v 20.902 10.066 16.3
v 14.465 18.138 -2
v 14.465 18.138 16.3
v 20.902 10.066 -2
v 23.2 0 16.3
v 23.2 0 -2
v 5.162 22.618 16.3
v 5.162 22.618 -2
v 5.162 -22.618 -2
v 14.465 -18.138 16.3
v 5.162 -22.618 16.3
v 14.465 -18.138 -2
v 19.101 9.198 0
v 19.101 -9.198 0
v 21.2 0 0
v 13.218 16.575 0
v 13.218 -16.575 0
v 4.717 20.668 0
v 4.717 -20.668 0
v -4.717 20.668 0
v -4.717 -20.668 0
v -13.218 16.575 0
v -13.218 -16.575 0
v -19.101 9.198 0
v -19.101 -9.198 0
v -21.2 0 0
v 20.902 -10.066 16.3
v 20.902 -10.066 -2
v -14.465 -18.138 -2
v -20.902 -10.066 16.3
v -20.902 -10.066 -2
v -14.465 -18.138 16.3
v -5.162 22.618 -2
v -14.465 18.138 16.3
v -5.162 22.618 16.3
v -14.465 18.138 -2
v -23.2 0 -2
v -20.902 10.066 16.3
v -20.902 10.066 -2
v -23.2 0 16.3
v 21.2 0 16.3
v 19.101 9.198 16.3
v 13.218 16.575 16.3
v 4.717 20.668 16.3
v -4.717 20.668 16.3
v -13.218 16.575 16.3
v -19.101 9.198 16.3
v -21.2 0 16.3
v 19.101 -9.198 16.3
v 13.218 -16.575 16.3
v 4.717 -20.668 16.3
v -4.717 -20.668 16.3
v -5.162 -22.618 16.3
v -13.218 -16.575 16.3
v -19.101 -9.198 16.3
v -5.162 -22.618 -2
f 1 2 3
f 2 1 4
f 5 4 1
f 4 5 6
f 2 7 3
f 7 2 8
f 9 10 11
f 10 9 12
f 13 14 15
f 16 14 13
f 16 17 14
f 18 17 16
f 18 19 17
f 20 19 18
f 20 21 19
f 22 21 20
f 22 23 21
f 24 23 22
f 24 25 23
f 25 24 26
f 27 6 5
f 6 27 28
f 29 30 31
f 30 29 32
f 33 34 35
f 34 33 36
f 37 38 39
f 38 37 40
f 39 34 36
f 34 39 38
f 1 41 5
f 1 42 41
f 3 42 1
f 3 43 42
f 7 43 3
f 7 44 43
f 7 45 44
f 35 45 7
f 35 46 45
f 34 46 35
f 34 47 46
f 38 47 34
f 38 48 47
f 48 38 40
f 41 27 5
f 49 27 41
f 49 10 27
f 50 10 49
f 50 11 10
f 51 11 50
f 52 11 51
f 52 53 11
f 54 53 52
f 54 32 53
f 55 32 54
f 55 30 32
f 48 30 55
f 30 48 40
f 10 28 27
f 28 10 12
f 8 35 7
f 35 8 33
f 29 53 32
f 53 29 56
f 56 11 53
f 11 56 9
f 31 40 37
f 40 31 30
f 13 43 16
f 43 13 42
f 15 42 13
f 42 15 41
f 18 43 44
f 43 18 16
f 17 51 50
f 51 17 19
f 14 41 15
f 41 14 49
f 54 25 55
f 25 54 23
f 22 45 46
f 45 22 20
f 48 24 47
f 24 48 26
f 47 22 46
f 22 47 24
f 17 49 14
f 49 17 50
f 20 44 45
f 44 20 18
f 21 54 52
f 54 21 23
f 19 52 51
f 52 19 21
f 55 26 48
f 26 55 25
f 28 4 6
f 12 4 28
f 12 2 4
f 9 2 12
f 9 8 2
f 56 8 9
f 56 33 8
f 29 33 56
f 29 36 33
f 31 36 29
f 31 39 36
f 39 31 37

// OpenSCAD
//Thickness
t=2;
//Durchmesser Kreis
dk=42.4;
//Durchmesser Kreis außen
dka=dk+t*2;
//Breite Klebeband + Tolerant
bkl=(25+2)*2;
//Tiefe Kreis
tk=16.3;

$fn=14;

difference()
{
color("green")
cylinder(h=tk, d=dka);

cylinder(h=tk, d=dk);
}

color("blue")
translate([0,0,-t])
//cube([bkl, bkl, t], center=true);
cylinder(h=t, d=dka);
